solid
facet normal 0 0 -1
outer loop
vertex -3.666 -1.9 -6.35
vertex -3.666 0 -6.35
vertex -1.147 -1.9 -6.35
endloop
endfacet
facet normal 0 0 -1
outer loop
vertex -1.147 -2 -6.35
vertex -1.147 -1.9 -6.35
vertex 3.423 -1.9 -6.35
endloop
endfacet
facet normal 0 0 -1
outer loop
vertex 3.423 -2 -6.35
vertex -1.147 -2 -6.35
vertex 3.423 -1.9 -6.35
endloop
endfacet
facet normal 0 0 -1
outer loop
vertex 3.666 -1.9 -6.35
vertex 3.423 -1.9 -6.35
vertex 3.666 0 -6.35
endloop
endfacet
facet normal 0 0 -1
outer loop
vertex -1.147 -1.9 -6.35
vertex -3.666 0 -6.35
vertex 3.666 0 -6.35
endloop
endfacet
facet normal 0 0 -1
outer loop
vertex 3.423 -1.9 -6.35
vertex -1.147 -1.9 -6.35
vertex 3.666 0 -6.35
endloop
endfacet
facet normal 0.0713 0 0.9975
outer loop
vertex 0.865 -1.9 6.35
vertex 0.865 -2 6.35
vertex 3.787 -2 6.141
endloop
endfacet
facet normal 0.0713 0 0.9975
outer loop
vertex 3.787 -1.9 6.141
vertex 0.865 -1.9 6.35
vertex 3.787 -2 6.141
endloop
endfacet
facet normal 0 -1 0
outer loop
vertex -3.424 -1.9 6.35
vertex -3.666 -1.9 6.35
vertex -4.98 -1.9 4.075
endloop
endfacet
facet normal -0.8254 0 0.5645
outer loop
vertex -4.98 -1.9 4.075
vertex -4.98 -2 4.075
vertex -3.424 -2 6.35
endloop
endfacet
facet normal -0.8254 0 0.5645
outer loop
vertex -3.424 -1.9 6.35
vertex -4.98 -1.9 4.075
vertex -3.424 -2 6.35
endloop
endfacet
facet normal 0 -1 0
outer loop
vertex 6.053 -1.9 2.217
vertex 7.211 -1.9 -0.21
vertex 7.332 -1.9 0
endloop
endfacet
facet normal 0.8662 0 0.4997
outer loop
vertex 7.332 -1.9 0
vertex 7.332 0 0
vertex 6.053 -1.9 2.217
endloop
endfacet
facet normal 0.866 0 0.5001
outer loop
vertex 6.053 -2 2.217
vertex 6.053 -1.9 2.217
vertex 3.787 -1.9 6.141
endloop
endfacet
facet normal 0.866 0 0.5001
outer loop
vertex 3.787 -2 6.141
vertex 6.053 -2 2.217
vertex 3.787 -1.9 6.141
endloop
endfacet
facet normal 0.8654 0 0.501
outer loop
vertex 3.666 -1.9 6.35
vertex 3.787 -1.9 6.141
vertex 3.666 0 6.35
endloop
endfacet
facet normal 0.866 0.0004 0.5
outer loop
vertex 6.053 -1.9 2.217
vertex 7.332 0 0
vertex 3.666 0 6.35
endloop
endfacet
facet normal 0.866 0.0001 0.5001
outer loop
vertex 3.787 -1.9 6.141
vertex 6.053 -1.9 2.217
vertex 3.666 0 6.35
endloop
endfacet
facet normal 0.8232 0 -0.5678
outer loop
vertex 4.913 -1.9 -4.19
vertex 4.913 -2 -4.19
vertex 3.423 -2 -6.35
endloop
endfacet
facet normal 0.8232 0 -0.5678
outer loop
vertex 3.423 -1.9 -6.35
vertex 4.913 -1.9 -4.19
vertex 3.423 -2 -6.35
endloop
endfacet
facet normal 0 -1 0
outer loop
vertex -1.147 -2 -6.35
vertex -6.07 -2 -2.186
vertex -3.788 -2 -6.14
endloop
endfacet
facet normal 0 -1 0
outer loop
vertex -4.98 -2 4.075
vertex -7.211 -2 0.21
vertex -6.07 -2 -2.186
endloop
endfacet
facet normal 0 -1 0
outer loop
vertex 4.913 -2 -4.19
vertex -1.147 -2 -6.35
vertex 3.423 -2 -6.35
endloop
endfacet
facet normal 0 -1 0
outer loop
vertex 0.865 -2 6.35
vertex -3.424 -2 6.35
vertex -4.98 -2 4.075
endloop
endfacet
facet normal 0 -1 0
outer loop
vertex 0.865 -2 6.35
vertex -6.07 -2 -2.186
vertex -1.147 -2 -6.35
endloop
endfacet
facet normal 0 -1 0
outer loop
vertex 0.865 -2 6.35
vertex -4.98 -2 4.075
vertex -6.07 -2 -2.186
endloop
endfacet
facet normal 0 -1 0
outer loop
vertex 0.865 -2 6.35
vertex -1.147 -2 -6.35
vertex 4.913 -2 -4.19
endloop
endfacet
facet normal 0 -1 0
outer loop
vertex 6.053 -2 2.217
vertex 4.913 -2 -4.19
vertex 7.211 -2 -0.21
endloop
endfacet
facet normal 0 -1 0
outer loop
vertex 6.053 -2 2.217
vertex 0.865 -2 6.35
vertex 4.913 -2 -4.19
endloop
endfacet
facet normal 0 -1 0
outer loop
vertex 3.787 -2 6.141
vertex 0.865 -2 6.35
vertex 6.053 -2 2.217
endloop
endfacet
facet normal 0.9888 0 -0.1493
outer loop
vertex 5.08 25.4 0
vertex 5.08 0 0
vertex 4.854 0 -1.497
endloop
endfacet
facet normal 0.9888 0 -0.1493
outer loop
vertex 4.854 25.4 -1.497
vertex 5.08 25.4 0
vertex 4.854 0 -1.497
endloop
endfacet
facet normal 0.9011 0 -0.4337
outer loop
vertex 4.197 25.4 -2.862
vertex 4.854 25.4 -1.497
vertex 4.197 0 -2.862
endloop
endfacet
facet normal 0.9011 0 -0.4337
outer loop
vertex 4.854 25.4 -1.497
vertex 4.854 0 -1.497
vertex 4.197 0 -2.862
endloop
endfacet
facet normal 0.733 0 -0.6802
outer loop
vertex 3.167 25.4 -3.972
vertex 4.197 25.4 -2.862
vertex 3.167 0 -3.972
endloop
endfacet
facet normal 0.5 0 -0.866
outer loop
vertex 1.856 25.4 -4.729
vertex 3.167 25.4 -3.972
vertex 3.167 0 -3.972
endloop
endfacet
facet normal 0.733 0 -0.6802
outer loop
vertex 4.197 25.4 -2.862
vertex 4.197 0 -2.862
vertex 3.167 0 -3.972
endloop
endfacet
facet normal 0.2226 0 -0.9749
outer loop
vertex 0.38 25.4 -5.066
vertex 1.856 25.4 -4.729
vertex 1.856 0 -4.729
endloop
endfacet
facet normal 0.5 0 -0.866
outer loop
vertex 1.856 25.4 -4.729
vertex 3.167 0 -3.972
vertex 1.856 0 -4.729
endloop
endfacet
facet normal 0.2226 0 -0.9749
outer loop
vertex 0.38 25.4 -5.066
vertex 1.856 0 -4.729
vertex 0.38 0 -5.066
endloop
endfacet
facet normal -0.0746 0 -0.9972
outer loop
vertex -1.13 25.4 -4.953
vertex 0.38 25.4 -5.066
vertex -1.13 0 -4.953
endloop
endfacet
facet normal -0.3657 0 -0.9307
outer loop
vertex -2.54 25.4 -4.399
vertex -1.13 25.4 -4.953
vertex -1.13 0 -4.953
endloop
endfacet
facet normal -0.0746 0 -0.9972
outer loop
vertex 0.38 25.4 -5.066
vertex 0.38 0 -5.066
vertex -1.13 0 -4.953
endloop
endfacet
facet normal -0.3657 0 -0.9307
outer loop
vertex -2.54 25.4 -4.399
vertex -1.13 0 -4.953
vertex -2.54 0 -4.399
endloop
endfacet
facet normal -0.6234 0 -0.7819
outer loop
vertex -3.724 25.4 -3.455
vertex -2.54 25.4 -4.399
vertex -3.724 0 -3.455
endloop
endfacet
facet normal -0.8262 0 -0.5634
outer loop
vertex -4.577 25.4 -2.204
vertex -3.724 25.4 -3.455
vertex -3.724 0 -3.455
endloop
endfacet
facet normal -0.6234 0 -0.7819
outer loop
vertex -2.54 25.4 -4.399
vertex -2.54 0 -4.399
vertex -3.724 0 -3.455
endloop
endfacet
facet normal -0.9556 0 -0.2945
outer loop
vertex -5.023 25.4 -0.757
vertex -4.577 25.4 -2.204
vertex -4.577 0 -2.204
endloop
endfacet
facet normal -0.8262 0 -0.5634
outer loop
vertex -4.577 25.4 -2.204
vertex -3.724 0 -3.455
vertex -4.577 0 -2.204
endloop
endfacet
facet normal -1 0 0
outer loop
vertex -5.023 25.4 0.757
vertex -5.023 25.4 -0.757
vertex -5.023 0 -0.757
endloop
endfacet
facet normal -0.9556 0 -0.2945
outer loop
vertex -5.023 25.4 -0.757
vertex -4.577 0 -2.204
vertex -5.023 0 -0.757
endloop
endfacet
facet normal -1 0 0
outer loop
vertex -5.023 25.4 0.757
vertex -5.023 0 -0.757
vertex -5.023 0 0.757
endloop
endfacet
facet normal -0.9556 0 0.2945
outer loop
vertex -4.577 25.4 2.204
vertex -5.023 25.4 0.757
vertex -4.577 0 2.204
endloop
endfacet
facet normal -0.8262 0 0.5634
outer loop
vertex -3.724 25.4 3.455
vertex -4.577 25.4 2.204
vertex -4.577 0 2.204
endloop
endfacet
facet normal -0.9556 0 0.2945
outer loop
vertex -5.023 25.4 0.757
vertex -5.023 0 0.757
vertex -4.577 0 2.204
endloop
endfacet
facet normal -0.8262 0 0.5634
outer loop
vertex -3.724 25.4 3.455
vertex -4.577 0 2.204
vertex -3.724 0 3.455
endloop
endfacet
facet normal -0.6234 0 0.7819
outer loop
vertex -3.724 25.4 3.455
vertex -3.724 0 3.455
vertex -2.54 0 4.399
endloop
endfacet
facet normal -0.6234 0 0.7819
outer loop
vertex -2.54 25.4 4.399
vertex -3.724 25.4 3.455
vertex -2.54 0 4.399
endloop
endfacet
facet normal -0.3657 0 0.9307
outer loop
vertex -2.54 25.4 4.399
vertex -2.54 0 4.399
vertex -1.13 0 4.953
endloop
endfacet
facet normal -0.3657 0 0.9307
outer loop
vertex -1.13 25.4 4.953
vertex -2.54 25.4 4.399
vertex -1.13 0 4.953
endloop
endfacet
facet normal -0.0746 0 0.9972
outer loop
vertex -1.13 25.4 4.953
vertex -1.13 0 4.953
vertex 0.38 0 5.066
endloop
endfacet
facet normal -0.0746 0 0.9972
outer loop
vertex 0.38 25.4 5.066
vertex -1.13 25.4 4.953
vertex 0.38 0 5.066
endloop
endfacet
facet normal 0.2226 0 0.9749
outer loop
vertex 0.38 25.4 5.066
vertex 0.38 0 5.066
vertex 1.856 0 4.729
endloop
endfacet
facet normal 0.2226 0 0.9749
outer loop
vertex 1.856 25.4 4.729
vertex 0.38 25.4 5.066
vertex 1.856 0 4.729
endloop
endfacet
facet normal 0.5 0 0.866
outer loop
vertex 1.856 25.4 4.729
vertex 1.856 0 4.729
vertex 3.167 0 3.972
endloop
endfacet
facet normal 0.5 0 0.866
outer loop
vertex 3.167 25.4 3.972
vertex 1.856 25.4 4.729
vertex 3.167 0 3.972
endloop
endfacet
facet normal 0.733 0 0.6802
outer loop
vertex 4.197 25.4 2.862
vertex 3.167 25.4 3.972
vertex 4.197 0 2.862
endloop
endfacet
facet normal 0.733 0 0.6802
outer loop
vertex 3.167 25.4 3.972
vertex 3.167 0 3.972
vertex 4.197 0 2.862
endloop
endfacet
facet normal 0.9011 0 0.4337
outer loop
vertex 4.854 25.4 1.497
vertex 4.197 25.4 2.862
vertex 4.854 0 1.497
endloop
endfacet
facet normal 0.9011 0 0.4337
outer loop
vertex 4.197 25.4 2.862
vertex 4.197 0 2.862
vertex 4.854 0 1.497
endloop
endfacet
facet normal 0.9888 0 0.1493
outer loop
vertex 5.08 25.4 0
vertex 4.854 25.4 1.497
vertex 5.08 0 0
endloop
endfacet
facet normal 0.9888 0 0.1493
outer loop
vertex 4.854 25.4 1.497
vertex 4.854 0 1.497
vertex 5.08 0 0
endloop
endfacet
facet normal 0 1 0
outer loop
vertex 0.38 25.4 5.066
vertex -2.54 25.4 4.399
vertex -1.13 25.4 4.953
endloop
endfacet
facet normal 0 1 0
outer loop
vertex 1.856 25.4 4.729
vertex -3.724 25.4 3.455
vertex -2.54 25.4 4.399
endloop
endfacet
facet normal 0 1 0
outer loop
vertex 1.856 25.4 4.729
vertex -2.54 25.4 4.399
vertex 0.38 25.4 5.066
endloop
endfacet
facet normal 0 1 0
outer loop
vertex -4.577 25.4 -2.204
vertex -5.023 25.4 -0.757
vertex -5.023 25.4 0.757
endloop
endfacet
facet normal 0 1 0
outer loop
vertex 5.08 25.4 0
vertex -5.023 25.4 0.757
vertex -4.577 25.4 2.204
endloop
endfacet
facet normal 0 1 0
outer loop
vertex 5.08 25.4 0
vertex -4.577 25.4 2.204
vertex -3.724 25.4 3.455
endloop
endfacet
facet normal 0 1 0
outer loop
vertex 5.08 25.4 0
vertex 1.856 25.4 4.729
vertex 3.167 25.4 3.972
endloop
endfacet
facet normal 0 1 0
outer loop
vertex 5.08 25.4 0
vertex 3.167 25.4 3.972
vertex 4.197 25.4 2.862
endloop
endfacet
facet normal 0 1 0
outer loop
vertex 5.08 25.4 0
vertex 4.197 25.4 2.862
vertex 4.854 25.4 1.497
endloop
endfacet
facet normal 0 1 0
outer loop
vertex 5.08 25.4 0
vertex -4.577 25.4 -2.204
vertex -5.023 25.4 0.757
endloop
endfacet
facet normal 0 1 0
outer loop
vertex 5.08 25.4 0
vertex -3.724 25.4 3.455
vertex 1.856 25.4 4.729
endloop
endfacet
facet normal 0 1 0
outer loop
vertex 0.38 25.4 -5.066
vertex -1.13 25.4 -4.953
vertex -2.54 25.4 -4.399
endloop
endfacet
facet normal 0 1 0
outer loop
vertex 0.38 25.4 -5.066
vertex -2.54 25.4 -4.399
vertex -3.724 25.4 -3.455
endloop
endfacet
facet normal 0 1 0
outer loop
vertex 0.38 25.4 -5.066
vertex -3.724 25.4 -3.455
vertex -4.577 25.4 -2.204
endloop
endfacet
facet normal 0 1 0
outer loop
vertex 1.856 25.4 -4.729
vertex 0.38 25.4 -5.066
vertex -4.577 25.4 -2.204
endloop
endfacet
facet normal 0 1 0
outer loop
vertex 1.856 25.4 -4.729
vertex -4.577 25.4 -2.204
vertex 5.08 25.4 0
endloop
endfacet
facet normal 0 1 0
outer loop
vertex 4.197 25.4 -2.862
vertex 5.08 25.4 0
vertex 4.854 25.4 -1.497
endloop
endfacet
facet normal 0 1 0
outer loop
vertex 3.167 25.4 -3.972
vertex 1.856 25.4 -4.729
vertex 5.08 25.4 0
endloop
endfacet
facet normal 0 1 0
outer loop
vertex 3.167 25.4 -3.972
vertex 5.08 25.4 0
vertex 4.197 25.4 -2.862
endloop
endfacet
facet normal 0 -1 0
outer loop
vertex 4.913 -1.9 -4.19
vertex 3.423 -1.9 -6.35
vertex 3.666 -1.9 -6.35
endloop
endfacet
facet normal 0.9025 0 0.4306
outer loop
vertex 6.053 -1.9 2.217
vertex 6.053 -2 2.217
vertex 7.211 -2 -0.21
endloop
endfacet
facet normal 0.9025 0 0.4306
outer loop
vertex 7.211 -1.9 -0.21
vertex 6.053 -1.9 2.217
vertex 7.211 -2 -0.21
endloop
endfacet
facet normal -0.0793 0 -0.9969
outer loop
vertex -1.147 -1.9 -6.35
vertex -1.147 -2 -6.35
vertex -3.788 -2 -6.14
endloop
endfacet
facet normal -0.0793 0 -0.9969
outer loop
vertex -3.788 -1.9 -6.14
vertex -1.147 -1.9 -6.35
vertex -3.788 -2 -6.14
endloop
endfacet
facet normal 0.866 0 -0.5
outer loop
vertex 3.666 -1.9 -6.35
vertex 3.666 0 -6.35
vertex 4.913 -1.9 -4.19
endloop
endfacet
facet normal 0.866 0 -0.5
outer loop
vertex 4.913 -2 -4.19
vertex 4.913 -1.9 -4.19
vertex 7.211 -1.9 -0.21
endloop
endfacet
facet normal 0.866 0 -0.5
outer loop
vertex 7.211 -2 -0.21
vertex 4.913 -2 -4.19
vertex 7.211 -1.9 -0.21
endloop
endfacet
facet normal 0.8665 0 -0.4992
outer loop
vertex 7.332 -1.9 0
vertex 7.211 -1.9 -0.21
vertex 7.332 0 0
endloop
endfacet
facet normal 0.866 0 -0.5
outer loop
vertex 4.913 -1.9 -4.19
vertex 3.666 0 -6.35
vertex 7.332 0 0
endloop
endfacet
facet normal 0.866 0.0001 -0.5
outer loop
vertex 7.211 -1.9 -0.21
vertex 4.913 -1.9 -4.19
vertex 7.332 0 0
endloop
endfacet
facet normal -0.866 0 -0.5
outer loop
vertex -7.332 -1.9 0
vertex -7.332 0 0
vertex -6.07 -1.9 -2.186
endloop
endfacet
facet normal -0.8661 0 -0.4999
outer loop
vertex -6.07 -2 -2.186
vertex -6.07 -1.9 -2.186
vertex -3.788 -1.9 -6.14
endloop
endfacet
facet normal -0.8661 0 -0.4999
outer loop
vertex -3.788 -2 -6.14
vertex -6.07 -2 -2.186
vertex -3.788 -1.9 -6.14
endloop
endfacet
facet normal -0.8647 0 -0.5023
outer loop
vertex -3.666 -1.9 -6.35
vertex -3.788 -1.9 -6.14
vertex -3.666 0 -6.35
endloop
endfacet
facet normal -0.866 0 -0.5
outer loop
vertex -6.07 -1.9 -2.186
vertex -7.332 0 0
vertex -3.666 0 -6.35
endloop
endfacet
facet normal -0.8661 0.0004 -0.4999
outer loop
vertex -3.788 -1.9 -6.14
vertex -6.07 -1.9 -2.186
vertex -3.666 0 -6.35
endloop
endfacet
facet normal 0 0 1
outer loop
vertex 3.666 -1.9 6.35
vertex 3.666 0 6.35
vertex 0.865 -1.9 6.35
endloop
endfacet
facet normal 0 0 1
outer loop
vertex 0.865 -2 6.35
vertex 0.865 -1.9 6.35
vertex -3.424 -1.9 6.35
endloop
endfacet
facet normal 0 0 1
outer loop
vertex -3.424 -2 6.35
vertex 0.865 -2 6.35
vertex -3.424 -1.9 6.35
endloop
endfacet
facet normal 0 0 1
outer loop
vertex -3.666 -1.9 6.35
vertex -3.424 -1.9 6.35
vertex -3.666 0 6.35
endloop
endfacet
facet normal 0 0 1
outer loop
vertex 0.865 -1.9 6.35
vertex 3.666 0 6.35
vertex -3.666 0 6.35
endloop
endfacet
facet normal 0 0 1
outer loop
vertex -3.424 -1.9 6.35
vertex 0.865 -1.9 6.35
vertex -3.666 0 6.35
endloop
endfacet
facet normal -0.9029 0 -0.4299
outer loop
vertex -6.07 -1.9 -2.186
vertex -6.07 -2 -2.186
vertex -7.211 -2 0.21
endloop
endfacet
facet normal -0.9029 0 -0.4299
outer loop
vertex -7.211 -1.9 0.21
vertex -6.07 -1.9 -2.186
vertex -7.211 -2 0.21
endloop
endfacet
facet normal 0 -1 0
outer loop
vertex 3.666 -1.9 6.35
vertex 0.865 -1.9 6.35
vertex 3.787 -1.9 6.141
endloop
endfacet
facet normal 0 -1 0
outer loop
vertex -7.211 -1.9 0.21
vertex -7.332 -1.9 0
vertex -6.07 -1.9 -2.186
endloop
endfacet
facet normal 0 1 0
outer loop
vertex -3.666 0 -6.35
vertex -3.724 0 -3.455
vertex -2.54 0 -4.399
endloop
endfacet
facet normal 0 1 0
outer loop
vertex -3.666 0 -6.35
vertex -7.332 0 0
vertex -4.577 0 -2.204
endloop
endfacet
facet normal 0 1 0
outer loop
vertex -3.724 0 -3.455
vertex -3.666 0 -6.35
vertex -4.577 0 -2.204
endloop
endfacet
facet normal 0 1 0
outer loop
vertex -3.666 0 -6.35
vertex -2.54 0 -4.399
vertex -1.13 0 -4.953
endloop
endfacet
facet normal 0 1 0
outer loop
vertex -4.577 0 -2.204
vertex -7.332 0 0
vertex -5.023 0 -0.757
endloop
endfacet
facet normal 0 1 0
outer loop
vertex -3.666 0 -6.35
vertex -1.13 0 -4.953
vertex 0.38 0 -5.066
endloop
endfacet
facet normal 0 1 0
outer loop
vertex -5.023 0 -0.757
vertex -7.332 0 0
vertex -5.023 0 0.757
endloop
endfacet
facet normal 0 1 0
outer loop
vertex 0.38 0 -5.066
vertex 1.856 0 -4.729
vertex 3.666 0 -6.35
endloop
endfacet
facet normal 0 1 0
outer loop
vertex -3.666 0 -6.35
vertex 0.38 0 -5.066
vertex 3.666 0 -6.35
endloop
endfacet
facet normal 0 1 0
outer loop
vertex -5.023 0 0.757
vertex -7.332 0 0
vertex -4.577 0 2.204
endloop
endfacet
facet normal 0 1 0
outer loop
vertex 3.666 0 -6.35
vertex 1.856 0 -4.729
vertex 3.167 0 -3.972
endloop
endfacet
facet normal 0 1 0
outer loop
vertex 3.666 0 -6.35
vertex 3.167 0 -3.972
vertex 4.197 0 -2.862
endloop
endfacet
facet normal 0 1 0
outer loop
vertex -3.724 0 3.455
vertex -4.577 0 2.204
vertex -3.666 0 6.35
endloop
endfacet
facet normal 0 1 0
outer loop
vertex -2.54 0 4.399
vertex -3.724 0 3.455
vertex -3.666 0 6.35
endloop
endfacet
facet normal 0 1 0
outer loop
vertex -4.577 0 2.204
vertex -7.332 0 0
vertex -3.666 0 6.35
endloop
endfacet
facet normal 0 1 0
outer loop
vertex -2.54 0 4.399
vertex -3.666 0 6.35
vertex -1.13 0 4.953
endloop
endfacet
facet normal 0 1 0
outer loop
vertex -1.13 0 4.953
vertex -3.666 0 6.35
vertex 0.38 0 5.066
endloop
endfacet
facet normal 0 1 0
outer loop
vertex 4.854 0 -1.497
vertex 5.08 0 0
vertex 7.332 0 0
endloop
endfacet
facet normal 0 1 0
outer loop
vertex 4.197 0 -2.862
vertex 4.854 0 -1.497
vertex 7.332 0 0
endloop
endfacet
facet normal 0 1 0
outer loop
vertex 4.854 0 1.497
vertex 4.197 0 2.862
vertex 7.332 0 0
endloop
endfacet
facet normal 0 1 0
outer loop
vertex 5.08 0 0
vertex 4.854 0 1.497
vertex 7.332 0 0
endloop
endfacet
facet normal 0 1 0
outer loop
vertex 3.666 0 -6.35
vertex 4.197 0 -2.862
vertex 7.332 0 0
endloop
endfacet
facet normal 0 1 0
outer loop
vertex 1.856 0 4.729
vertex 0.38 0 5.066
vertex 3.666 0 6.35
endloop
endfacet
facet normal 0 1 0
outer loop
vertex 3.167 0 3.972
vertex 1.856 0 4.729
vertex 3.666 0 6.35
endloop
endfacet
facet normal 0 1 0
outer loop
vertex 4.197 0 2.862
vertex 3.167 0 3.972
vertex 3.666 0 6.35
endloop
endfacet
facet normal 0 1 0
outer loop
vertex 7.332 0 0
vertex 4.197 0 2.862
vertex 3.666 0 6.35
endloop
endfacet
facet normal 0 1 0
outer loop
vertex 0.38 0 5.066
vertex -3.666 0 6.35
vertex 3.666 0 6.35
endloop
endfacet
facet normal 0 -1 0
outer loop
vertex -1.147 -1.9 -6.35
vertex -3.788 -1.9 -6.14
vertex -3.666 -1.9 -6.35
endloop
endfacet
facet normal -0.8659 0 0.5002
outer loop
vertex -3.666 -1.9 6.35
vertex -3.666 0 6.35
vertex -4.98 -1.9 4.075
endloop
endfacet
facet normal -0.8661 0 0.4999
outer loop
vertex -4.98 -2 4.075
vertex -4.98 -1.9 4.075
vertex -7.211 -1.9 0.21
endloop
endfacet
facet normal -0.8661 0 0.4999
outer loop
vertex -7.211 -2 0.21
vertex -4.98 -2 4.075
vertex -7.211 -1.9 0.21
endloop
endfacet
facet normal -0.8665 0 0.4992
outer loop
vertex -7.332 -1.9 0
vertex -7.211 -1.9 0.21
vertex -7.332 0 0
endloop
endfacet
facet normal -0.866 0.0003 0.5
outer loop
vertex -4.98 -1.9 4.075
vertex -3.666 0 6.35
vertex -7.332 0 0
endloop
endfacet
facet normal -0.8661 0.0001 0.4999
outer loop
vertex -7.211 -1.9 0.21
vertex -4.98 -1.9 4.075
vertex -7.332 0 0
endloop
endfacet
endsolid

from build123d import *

# Parameters (mm, degrees)
SKETCH1_R           = 5.08
BOSS_EXTRUDE1_DEPTH = 25.4
BOSS_EXTRUDE2_DEPTH = 2
CUT_EXTRUDE1_DEPTH  = 0.1


with BuildPart() as part:
    # Sketch1 → Boss-Extrude1 (new body)
    with BuildSketch(Plane(origin=(0, 0, 0), x_dir=(1, 0, 0), z_dir=(0, 1, 0))):
        Circle(SKETCH1_R)
    extrude(amount=BOSS_EXTRUDE1_DEPTH)

    # Sketch2 → Boss-Extrude2 (add)
    with BuildSketch(Plane.XZ):
        Polygon((-7.332348419, 0), (-3.666174209, -6.35), (3.666174209, -6.35), (7.332348419, 0), (3.666174209, 6.35), (-3.666174209, 6.35), align=None)
    extrude(amount=BOSS_EXTRUDE2_DEPTH)

    # Sketch3 → Cut-Extrude1 (cut)
    with BuildSketch(Plane.XZ.offset(2)):
        Polygon((-4.979562137, 4.075145379), (-3.423879788, 6.35), (-3.666174209, 6.35), align=None)
        Polygon((0.86519926, 6.35), (3.786930674, 6.140843669), (3.666174209, 6.35), align=None)
        Polygon((6.052569822, 2.216641552), (7.211034583, -0.210121728), (7.332348419, 0), align=None)
        Polygon((4.91331885, -4.189882119), (3.423203754, -6.35), (3.666174209, -6.35), align=None)
        Polygon((-1.147445647, -6.35), (-3.787594099, -6.139694582), (-3.666174209, -6.35), align=None)
        Polygon((-6.07045658, -2.185660778), (-7.210941867, 0.210282315), (-7.332348419, 0), align=None)
    extrude(amount=-CUT_EXTRUDE1_DEPTH, mode=Mode.SUBTRACT)


solid = part.part
